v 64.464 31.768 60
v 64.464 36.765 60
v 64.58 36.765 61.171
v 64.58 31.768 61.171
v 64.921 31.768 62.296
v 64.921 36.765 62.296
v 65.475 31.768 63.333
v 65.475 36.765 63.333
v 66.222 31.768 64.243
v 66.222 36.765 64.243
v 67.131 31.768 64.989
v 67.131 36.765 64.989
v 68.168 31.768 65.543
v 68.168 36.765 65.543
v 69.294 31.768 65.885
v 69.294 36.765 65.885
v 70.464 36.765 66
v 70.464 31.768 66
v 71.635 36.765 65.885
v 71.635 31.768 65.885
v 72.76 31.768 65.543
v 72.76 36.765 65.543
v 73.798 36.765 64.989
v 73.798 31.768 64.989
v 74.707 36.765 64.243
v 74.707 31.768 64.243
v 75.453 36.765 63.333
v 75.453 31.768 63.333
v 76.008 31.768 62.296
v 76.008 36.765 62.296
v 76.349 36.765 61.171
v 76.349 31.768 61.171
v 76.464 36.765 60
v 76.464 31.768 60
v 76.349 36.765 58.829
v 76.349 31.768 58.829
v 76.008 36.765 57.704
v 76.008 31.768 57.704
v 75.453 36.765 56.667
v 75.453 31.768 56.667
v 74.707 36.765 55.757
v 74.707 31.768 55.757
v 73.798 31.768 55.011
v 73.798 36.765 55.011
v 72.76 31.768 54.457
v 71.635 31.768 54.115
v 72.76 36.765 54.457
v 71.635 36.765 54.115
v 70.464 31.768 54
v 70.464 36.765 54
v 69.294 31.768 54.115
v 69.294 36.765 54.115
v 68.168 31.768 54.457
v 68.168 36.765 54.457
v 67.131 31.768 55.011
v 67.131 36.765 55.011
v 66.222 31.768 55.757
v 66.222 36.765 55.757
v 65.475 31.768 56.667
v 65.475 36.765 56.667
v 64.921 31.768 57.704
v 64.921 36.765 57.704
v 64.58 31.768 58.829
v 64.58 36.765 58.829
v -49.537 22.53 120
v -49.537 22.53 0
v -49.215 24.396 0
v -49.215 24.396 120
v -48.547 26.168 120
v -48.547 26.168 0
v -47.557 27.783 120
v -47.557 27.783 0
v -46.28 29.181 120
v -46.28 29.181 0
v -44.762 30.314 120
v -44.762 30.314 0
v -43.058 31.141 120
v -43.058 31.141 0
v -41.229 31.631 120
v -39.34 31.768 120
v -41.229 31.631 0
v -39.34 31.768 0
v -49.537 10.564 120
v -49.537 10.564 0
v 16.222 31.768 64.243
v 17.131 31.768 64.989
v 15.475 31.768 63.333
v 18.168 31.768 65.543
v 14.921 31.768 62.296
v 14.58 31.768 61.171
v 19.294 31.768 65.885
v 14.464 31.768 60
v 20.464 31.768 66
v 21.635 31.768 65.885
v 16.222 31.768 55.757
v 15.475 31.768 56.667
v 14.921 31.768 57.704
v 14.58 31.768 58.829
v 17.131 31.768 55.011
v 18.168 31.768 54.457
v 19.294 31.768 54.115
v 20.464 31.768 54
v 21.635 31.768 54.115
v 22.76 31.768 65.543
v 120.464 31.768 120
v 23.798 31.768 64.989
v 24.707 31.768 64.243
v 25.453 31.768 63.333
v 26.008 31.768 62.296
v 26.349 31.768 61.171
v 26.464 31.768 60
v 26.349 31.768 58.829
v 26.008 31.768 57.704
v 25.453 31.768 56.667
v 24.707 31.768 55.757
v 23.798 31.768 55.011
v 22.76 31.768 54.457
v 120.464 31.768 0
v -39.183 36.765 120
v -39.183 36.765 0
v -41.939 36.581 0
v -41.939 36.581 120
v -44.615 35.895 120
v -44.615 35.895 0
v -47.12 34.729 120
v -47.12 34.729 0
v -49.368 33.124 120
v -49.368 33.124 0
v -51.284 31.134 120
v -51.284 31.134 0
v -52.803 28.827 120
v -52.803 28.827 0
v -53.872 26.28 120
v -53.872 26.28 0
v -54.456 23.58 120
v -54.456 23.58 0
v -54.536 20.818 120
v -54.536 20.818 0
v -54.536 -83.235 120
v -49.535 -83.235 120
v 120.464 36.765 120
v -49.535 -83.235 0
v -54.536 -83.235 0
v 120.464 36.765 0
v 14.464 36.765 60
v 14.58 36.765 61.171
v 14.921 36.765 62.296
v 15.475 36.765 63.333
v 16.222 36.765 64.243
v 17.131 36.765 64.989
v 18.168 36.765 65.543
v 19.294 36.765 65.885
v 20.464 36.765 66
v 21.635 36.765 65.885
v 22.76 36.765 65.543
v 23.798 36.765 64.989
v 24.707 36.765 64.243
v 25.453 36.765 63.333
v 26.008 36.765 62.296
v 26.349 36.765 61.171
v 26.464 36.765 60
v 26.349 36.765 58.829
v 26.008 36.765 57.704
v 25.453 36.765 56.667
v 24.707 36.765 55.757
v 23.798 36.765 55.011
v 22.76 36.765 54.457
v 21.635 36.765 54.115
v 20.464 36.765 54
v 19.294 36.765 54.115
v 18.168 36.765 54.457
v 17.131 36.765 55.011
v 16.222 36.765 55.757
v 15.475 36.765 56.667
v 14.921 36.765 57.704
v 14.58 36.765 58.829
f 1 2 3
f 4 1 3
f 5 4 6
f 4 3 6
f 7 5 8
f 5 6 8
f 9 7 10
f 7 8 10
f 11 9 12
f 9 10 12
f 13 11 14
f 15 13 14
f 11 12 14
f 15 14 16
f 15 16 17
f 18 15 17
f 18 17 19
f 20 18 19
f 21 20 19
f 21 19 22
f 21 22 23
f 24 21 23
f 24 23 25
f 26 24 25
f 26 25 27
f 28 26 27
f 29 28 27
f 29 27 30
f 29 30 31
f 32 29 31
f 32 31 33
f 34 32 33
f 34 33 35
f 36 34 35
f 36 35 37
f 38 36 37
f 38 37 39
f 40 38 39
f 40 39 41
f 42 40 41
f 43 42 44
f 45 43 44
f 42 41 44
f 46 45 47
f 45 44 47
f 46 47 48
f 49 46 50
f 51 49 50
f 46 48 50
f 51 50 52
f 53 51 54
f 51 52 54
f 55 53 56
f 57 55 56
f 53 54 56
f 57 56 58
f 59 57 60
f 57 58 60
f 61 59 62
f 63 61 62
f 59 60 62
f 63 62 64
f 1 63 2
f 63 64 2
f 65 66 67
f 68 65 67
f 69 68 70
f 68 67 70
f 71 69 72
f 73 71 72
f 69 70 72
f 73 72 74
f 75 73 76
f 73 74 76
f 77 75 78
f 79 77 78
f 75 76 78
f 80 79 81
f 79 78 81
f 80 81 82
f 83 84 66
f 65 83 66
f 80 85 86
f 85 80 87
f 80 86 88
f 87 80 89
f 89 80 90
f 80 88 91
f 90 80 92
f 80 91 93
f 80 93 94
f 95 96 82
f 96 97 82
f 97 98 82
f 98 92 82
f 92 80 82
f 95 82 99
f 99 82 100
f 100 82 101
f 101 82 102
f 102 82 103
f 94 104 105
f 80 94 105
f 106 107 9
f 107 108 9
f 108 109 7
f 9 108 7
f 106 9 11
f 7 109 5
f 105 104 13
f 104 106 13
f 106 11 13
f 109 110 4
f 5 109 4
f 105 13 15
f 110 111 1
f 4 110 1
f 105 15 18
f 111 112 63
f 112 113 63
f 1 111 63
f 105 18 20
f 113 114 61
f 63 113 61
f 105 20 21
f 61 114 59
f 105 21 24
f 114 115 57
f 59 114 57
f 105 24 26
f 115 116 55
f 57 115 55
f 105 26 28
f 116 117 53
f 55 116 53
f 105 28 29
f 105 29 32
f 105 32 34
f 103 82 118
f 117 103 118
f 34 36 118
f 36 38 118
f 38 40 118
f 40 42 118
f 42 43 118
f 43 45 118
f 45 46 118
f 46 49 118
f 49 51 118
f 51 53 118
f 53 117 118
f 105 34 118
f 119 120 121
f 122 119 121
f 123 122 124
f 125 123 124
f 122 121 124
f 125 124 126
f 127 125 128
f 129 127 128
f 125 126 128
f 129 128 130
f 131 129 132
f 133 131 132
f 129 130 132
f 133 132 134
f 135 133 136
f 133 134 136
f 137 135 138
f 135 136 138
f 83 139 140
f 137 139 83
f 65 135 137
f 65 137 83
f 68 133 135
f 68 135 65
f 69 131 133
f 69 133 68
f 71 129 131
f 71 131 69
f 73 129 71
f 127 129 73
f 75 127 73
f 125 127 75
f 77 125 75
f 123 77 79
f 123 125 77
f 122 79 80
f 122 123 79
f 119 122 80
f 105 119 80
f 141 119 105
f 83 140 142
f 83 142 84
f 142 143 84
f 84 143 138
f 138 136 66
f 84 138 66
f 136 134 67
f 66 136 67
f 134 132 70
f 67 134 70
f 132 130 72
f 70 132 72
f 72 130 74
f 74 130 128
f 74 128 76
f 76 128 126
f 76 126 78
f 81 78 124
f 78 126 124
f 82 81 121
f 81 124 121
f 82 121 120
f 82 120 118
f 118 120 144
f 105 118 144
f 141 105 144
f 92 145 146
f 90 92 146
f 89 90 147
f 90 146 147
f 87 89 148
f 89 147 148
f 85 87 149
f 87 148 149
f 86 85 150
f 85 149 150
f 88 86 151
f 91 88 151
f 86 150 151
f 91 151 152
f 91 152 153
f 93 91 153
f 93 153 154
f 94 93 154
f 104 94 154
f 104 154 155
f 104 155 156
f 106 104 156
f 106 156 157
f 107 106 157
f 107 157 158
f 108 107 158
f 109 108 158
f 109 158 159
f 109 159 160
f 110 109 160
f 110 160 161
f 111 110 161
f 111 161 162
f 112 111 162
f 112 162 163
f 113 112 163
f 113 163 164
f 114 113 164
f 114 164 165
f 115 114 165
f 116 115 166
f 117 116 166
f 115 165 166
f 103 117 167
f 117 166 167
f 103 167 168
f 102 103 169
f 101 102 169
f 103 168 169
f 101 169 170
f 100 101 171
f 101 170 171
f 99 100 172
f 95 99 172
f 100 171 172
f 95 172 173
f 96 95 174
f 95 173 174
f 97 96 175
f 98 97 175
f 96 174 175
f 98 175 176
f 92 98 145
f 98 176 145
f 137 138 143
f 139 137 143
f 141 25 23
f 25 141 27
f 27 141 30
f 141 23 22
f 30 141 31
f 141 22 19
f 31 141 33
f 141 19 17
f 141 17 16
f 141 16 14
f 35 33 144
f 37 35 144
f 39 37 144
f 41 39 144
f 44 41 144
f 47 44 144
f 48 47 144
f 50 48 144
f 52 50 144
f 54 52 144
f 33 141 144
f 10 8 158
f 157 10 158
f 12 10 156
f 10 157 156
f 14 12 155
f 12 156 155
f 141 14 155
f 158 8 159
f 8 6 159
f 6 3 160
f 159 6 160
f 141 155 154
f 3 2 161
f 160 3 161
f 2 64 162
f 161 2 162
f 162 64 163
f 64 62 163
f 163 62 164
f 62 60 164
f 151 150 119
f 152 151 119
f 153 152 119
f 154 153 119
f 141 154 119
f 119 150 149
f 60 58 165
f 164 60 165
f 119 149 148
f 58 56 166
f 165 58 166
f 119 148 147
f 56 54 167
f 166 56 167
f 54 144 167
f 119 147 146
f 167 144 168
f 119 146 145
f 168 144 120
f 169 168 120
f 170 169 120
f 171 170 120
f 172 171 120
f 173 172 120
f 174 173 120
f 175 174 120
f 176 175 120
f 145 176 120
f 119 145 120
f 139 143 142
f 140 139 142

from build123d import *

# Parameters (mm, degrees)
F1_DEPTH = 120
F2_R     = 6
F3_DEPTH = 5


with BuildPart() as f1:
    # F0 (on Top) → F1 (new body)
    with BuildSketch(Plane.XY):
        with BuildLine():
            Line((120.464271, 36.765282), (-39.183099, 36.765282))
            ThreePointArc((-39.183099, 36.765282), (-50.372007, 32.173501), (-54.535729, 20.818346))
            Line((-54.535729, 20.818346), (-54.535729, -83.234718))
            Line((-54.535729, -83.234718), (-49.535177, -83.234718))
            Line((-49.535177, -83.234718), (-49.536819, 10.563834))
            Line((-49.536819, 10.563834), (-49.537028, 22.530258))
            ThreePointArc((-49.537028, 22.530258), (-46.279821, 29.181243), (-39.340395, 31.767623))
            Line((-39.340395, 31.767623), (-28.383342, 31.767623))
            Line((-28.383342, 31.767623), (120.464271, 31.767623))
            Line((120.464271, 31.767623), (120.464271, 36.765282))
        make_face()
    extrude(amount=F1_DEPTH)

    # F2 (on face) → F3 (cut)
    with BuildSketch(Plane(origin=(0, 36.765282, 0), x_dir=(-1, 0, 0), z_dir=(0, 1, 0))):
        with Locations((-70.464271, 60)):
            Circle(F2_R)
        with Locations((-20.464271, 60)):
            Circle(F2_R)
    extrude(amount=-F3_DEPTH, mode=Mode.SUBTRACT)


solid = f1.part
